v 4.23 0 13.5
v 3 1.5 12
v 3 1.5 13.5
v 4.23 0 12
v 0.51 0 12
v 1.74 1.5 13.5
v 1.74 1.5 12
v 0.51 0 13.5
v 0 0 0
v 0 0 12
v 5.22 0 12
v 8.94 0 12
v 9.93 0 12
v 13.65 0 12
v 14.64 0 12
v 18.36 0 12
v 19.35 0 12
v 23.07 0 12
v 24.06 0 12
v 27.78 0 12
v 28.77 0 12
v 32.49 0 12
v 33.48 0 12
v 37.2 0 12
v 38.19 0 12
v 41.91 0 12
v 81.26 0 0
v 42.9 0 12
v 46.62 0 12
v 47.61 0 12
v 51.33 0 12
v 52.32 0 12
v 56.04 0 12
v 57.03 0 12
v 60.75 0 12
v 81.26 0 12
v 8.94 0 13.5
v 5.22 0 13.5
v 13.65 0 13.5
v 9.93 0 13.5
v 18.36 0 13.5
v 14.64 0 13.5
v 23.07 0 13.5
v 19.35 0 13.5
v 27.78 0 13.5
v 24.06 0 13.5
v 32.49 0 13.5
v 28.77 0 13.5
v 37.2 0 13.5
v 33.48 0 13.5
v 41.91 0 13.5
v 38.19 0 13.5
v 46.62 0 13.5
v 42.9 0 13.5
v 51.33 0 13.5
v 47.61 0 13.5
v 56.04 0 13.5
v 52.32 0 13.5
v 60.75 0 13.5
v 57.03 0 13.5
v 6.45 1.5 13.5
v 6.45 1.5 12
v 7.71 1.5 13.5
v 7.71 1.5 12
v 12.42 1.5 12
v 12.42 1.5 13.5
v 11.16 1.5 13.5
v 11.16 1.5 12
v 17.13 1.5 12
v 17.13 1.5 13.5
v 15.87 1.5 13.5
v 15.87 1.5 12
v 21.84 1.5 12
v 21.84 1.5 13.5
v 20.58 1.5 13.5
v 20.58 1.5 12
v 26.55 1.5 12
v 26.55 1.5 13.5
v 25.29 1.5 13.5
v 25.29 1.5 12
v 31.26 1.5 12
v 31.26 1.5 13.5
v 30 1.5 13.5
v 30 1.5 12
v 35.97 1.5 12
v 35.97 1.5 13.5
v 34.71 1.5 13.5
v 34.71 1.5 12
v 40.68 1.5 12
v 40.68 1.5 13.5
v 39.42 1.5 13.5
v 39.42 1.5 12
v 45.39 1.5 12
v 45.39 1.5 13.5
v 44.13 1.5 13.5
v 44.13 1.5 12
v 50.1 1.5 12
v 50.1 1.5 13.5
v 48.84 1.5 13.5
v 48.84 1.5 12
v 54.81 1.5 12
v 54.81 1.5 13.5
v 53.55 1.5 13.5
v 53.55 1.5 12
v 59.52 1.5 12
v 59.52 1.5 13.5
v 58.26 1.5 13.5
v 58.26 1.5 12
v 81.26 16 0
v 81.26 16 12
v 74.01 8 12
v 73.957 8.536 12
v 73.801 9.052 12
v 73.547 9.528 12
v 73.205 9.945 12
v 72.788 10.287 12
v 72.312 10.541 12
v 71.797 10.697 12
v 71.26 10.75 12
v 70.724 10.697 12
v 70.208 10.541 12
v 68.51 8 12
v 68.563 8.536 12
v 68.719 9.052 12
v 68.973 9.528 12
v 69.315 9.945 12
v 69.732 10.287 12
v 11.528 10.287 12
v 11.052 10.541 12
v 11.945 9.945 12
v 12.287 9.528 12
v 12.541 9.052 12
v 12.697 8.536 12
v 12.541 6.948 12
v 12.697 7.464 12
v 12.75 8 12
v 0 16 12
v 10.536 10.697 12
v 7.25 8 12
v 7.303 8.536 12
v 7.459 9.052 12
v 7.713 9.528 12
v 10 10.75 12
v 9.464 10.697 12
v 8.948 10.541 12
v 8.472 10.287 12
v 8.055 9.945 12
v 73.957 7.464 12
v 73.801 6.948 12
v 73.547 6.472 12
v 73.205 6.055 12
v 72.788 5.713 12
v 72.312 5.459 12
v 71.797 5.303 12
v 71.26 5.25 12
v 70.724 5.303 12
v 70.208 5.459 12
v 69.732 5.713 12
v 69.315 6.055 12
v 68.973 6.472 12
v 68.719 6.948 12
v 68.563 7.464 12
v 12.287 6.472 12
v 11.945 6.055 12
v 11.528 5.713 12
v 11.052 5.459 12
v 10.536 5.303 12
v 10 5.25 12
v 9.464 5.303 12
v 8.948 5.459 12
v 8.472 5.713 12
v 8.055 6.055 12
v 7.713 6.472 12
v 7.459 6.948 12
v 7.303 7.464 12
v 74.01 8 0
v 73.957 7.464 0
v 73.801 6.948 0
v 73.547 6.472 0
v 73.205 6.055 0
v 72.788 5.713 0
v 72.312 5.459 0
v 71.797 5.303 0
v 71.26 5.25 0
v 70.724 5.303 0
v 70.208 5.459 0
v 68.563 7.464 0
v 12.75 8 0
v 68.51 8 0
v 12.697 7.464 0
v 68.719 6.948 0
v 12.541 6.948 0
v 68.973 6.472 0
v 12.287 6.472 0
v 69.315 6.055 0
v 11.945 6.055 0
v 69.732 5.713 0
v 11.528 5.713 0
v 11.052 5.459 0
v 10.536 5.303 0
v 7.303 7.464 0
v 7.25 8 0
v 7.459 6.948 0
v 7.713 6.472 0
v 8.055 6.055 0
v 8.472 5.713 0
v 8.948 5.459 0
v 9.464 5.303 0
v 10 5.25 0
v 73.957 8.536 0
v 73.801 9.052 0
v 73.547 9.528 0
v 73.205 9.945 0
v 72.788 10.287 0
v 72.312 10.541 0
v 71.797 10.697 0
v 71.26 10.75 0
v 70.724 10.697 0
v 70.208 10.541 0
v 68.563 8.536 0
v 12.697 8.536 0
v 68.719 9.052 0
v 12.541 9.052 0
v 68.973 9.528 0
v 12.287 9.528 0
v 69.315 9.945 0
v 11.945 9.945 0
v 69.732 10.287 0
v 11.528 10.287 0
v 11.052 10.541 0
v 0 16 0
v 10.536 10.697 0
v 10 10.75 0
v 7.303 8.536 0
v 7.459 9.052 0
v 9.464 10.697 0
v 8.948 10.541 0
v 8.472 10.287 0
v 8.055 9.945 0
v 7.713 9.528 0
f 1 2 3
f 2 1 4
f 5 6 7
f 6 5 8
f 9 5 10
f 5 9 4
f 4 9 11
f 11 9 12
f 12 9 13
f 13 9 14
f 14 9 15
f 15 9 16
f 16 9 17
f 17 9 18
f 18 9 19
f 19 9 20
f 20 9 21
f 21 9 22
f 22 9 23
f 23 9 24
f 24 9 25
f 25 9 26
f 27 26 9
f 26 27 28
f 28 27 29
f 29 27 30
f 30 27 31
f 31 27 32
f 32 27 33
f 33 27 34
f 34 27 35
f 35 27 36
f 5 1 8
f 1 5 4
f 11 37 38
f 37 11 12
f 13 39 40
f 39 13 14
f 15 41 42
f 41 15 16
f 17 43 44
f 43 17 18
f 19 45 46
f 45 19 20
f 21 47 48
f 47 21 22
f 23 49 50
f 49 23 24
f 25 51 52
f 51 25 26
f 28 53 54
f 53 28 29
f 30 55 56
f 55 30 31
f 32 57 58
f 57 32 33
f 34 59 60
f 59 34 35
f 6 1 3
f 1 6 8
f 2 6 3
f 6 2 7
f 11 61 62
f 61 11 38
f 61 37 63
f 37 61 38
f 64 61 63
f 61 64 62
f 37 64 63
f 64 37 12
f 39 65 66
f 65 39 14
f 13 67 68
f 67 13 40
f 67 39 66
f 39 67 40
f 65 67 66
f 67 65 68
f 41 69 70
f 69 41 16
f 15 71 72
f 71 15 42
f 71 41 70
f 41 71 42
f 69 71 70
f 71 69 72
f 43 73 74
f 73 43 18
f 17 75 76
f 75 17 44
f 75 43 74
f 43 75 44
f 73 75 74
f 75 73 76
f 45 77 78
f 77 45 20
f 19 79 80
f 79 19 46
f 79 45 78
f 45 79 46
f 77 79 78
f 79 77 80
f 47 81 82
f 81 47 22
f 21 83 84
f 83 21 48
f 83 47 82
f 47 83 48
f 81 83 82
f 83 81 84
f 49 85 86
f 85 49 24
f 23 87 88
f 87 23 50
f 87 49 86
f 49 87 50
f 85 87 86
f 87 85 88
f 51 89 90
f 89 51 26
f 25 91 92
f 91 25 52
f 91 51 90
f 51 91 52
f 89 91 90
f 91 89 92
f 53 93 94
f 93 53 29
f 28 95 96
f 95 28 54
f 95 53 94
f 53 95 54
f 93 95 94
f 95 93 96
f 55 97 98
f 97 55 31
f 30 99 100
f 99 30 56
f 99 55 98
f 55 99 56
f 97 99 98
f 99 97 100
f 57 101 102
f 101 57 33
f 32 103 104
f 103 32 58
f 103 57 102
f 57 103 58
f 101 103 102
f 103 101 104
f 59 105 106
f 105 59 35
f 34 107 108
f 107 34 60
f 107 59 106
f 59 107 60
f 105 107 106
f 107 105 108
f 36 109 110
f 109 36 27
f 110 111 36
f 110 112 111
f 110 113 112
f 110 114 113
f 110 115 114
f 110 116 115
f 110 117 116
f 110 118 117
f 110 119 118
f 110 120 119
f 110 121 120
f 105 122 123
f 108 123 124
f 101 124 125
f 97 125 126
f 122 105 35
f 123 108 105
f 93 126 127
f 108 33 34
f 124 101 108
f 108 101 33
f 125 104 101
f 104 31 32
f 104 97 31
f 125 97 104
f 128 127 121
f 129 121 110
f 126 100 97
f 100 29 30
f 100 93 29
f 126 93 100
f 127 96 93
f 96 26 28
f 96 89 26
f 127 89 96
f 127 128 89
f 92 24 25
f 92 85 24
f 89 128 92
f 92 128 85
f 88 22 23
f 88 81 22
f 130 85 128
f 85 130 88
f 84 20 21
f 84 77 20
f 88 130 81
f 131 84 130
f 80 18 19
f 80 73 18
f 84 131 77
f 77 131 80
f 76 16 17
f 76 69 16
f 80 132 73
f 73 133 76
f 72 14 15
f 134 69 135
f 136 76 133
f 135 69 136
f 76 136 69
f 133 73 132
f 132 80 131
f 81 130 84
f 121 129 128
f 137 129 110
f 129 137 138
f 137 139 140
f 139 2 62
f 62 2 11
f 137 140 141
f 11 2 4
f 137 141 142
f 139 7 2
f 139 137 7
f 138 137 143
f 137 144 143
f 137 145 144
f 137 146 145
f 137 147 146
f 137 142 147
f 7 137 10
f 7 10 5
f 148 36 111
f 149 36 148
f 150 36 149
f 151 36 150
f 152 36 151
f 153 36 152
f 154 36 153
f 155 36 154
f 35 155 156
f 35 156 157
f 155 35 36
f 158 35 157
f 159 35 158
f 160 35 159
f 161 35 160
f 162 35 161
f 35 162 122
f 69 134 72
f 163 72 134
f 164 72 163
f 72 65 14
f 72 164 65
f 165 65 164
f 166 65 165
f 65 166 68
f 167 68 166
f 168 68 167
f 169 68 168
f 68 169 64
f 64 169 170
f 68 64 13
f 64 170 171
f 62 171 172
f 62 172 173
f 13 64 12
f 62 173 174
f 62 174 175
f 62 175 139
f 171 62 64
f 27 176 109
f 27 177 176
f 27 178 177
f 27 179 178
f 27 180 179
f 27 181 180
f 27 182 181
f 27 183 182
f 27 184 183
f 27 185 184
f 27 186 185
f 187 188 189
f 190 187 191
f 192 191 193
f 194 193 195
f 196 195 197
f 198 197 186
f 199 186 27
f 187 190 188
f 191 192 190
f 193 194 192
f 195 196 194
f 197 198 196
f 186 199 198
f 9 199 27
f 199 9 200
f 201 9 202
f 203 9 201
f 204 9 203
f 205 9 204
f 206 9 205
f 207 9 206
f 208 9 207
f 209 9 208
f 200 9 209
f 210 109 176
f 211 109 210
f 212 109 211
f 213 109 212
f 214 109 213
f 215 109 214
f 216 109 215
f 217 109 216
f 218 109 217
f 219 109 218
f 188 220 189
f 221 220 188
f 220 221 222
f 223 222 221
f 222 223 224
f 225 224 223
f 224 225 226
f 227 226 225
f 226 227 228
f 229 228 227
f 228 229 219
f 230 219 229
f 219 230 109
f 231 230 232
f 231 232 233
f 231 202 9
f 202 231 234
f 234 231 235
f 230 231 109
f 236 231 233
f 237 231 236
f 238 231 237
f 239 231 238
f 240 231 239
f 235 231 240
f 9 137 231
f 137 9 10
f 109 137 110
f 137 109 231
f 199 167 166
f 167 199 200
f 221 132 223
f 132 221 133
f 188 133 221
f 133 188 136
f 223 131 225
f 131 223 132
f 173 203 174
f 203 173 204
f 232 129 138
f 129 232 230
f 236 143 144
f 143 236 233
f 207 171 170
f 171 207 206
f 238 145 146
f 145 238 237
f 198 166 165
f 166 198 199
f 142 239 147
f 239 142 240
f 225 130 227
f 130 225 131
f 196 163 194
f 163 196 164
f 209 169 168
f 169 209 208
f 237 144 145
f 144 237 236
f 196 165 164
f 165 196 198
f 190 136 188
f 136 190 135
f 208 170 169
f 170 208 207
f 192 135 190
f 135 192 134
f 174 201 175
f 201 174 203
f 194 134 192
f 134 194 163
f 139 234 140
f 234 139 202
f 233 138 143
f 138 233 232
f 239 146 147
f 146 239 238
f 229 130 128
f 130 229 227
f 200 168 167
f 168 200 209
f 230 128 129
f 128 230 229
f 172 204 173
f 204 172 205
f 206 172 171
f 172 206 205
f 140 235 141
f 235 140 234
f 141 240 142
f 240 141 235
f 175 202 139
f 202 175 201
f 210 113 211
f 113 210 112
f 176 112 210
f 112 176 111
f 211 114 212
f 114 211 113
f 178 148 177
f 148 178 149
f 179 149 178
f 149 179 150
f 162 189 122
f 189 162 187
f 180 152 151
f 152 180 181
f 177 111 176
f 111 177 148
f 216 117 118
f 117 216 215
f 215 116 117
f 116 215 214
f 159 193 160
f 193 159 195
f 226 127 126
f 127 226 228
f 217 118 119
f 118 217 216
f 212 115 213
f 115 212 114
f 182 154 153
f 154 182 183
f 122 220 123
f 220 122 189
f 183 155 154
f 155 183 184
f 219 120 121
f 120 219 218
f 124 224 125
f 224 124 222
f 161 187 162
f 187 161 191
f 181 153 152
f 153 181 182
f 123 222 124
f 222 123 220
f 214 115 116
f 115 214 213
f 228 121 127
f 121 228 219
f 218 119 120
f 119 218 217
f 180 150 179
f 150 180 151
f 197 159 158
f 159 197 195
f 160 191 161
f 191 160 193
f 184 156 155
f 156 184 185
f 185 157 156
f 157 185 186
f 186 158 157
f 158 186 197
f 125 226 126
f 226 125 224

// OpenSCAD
$fn = 32;

// ----------------------------------------------------------------------
// Gear rack: m=1.5 z=13, 81.26 x 16 x 13.5 mm
// ----------------------------------------------------------------------

// --- parameters (mm) ---
rack_len = 81.26;         // rack length, X
rack_w = 16;              // rack width, Y
rack_h = 13.5;            // overall height, Z
modul = 1.5;              // module
body_t = 12;              // tooth root line height
pitch = 4.71;             // circular pitch
tip_w = 1.26;             // tooth thickness at the tip
root_w = 3.72;            // tooth thickness at the root line
hole_d = 5.5;             // mounting hole
sink = 0.6;               // tooth root overlap into the body

tooth_span = 61.26;

module tooth(x0) {
  /* 20 deg flank profile, sunk into the body for a positive overlap */
  translate([x0, 0, body_t - sink])
    linear_extrude(height = rack_h - body_t + sink)
      polygon(points = [[-root_w / 2, 0], [root_w / 2, 0],
                        [tip_w / 2, rack_h - body_t],
                        [-tip_w / 2, rack_h - body_t]]);
}

difference() {
  union() {
    cube([rack_len, rack_w, body_t]);
    for (i = [0 : 13 - 1])
      tooth((i + 0.5) * pitch + (tooth_span - 13 * pitch) / 2);
  }
  translate([10, 8, -1]) cylinder(h = body_t + 2, d = hole_d);
  translate([71.26, 8, -1]) cylinder(h = body_t + 2, d = hole_d);
}
